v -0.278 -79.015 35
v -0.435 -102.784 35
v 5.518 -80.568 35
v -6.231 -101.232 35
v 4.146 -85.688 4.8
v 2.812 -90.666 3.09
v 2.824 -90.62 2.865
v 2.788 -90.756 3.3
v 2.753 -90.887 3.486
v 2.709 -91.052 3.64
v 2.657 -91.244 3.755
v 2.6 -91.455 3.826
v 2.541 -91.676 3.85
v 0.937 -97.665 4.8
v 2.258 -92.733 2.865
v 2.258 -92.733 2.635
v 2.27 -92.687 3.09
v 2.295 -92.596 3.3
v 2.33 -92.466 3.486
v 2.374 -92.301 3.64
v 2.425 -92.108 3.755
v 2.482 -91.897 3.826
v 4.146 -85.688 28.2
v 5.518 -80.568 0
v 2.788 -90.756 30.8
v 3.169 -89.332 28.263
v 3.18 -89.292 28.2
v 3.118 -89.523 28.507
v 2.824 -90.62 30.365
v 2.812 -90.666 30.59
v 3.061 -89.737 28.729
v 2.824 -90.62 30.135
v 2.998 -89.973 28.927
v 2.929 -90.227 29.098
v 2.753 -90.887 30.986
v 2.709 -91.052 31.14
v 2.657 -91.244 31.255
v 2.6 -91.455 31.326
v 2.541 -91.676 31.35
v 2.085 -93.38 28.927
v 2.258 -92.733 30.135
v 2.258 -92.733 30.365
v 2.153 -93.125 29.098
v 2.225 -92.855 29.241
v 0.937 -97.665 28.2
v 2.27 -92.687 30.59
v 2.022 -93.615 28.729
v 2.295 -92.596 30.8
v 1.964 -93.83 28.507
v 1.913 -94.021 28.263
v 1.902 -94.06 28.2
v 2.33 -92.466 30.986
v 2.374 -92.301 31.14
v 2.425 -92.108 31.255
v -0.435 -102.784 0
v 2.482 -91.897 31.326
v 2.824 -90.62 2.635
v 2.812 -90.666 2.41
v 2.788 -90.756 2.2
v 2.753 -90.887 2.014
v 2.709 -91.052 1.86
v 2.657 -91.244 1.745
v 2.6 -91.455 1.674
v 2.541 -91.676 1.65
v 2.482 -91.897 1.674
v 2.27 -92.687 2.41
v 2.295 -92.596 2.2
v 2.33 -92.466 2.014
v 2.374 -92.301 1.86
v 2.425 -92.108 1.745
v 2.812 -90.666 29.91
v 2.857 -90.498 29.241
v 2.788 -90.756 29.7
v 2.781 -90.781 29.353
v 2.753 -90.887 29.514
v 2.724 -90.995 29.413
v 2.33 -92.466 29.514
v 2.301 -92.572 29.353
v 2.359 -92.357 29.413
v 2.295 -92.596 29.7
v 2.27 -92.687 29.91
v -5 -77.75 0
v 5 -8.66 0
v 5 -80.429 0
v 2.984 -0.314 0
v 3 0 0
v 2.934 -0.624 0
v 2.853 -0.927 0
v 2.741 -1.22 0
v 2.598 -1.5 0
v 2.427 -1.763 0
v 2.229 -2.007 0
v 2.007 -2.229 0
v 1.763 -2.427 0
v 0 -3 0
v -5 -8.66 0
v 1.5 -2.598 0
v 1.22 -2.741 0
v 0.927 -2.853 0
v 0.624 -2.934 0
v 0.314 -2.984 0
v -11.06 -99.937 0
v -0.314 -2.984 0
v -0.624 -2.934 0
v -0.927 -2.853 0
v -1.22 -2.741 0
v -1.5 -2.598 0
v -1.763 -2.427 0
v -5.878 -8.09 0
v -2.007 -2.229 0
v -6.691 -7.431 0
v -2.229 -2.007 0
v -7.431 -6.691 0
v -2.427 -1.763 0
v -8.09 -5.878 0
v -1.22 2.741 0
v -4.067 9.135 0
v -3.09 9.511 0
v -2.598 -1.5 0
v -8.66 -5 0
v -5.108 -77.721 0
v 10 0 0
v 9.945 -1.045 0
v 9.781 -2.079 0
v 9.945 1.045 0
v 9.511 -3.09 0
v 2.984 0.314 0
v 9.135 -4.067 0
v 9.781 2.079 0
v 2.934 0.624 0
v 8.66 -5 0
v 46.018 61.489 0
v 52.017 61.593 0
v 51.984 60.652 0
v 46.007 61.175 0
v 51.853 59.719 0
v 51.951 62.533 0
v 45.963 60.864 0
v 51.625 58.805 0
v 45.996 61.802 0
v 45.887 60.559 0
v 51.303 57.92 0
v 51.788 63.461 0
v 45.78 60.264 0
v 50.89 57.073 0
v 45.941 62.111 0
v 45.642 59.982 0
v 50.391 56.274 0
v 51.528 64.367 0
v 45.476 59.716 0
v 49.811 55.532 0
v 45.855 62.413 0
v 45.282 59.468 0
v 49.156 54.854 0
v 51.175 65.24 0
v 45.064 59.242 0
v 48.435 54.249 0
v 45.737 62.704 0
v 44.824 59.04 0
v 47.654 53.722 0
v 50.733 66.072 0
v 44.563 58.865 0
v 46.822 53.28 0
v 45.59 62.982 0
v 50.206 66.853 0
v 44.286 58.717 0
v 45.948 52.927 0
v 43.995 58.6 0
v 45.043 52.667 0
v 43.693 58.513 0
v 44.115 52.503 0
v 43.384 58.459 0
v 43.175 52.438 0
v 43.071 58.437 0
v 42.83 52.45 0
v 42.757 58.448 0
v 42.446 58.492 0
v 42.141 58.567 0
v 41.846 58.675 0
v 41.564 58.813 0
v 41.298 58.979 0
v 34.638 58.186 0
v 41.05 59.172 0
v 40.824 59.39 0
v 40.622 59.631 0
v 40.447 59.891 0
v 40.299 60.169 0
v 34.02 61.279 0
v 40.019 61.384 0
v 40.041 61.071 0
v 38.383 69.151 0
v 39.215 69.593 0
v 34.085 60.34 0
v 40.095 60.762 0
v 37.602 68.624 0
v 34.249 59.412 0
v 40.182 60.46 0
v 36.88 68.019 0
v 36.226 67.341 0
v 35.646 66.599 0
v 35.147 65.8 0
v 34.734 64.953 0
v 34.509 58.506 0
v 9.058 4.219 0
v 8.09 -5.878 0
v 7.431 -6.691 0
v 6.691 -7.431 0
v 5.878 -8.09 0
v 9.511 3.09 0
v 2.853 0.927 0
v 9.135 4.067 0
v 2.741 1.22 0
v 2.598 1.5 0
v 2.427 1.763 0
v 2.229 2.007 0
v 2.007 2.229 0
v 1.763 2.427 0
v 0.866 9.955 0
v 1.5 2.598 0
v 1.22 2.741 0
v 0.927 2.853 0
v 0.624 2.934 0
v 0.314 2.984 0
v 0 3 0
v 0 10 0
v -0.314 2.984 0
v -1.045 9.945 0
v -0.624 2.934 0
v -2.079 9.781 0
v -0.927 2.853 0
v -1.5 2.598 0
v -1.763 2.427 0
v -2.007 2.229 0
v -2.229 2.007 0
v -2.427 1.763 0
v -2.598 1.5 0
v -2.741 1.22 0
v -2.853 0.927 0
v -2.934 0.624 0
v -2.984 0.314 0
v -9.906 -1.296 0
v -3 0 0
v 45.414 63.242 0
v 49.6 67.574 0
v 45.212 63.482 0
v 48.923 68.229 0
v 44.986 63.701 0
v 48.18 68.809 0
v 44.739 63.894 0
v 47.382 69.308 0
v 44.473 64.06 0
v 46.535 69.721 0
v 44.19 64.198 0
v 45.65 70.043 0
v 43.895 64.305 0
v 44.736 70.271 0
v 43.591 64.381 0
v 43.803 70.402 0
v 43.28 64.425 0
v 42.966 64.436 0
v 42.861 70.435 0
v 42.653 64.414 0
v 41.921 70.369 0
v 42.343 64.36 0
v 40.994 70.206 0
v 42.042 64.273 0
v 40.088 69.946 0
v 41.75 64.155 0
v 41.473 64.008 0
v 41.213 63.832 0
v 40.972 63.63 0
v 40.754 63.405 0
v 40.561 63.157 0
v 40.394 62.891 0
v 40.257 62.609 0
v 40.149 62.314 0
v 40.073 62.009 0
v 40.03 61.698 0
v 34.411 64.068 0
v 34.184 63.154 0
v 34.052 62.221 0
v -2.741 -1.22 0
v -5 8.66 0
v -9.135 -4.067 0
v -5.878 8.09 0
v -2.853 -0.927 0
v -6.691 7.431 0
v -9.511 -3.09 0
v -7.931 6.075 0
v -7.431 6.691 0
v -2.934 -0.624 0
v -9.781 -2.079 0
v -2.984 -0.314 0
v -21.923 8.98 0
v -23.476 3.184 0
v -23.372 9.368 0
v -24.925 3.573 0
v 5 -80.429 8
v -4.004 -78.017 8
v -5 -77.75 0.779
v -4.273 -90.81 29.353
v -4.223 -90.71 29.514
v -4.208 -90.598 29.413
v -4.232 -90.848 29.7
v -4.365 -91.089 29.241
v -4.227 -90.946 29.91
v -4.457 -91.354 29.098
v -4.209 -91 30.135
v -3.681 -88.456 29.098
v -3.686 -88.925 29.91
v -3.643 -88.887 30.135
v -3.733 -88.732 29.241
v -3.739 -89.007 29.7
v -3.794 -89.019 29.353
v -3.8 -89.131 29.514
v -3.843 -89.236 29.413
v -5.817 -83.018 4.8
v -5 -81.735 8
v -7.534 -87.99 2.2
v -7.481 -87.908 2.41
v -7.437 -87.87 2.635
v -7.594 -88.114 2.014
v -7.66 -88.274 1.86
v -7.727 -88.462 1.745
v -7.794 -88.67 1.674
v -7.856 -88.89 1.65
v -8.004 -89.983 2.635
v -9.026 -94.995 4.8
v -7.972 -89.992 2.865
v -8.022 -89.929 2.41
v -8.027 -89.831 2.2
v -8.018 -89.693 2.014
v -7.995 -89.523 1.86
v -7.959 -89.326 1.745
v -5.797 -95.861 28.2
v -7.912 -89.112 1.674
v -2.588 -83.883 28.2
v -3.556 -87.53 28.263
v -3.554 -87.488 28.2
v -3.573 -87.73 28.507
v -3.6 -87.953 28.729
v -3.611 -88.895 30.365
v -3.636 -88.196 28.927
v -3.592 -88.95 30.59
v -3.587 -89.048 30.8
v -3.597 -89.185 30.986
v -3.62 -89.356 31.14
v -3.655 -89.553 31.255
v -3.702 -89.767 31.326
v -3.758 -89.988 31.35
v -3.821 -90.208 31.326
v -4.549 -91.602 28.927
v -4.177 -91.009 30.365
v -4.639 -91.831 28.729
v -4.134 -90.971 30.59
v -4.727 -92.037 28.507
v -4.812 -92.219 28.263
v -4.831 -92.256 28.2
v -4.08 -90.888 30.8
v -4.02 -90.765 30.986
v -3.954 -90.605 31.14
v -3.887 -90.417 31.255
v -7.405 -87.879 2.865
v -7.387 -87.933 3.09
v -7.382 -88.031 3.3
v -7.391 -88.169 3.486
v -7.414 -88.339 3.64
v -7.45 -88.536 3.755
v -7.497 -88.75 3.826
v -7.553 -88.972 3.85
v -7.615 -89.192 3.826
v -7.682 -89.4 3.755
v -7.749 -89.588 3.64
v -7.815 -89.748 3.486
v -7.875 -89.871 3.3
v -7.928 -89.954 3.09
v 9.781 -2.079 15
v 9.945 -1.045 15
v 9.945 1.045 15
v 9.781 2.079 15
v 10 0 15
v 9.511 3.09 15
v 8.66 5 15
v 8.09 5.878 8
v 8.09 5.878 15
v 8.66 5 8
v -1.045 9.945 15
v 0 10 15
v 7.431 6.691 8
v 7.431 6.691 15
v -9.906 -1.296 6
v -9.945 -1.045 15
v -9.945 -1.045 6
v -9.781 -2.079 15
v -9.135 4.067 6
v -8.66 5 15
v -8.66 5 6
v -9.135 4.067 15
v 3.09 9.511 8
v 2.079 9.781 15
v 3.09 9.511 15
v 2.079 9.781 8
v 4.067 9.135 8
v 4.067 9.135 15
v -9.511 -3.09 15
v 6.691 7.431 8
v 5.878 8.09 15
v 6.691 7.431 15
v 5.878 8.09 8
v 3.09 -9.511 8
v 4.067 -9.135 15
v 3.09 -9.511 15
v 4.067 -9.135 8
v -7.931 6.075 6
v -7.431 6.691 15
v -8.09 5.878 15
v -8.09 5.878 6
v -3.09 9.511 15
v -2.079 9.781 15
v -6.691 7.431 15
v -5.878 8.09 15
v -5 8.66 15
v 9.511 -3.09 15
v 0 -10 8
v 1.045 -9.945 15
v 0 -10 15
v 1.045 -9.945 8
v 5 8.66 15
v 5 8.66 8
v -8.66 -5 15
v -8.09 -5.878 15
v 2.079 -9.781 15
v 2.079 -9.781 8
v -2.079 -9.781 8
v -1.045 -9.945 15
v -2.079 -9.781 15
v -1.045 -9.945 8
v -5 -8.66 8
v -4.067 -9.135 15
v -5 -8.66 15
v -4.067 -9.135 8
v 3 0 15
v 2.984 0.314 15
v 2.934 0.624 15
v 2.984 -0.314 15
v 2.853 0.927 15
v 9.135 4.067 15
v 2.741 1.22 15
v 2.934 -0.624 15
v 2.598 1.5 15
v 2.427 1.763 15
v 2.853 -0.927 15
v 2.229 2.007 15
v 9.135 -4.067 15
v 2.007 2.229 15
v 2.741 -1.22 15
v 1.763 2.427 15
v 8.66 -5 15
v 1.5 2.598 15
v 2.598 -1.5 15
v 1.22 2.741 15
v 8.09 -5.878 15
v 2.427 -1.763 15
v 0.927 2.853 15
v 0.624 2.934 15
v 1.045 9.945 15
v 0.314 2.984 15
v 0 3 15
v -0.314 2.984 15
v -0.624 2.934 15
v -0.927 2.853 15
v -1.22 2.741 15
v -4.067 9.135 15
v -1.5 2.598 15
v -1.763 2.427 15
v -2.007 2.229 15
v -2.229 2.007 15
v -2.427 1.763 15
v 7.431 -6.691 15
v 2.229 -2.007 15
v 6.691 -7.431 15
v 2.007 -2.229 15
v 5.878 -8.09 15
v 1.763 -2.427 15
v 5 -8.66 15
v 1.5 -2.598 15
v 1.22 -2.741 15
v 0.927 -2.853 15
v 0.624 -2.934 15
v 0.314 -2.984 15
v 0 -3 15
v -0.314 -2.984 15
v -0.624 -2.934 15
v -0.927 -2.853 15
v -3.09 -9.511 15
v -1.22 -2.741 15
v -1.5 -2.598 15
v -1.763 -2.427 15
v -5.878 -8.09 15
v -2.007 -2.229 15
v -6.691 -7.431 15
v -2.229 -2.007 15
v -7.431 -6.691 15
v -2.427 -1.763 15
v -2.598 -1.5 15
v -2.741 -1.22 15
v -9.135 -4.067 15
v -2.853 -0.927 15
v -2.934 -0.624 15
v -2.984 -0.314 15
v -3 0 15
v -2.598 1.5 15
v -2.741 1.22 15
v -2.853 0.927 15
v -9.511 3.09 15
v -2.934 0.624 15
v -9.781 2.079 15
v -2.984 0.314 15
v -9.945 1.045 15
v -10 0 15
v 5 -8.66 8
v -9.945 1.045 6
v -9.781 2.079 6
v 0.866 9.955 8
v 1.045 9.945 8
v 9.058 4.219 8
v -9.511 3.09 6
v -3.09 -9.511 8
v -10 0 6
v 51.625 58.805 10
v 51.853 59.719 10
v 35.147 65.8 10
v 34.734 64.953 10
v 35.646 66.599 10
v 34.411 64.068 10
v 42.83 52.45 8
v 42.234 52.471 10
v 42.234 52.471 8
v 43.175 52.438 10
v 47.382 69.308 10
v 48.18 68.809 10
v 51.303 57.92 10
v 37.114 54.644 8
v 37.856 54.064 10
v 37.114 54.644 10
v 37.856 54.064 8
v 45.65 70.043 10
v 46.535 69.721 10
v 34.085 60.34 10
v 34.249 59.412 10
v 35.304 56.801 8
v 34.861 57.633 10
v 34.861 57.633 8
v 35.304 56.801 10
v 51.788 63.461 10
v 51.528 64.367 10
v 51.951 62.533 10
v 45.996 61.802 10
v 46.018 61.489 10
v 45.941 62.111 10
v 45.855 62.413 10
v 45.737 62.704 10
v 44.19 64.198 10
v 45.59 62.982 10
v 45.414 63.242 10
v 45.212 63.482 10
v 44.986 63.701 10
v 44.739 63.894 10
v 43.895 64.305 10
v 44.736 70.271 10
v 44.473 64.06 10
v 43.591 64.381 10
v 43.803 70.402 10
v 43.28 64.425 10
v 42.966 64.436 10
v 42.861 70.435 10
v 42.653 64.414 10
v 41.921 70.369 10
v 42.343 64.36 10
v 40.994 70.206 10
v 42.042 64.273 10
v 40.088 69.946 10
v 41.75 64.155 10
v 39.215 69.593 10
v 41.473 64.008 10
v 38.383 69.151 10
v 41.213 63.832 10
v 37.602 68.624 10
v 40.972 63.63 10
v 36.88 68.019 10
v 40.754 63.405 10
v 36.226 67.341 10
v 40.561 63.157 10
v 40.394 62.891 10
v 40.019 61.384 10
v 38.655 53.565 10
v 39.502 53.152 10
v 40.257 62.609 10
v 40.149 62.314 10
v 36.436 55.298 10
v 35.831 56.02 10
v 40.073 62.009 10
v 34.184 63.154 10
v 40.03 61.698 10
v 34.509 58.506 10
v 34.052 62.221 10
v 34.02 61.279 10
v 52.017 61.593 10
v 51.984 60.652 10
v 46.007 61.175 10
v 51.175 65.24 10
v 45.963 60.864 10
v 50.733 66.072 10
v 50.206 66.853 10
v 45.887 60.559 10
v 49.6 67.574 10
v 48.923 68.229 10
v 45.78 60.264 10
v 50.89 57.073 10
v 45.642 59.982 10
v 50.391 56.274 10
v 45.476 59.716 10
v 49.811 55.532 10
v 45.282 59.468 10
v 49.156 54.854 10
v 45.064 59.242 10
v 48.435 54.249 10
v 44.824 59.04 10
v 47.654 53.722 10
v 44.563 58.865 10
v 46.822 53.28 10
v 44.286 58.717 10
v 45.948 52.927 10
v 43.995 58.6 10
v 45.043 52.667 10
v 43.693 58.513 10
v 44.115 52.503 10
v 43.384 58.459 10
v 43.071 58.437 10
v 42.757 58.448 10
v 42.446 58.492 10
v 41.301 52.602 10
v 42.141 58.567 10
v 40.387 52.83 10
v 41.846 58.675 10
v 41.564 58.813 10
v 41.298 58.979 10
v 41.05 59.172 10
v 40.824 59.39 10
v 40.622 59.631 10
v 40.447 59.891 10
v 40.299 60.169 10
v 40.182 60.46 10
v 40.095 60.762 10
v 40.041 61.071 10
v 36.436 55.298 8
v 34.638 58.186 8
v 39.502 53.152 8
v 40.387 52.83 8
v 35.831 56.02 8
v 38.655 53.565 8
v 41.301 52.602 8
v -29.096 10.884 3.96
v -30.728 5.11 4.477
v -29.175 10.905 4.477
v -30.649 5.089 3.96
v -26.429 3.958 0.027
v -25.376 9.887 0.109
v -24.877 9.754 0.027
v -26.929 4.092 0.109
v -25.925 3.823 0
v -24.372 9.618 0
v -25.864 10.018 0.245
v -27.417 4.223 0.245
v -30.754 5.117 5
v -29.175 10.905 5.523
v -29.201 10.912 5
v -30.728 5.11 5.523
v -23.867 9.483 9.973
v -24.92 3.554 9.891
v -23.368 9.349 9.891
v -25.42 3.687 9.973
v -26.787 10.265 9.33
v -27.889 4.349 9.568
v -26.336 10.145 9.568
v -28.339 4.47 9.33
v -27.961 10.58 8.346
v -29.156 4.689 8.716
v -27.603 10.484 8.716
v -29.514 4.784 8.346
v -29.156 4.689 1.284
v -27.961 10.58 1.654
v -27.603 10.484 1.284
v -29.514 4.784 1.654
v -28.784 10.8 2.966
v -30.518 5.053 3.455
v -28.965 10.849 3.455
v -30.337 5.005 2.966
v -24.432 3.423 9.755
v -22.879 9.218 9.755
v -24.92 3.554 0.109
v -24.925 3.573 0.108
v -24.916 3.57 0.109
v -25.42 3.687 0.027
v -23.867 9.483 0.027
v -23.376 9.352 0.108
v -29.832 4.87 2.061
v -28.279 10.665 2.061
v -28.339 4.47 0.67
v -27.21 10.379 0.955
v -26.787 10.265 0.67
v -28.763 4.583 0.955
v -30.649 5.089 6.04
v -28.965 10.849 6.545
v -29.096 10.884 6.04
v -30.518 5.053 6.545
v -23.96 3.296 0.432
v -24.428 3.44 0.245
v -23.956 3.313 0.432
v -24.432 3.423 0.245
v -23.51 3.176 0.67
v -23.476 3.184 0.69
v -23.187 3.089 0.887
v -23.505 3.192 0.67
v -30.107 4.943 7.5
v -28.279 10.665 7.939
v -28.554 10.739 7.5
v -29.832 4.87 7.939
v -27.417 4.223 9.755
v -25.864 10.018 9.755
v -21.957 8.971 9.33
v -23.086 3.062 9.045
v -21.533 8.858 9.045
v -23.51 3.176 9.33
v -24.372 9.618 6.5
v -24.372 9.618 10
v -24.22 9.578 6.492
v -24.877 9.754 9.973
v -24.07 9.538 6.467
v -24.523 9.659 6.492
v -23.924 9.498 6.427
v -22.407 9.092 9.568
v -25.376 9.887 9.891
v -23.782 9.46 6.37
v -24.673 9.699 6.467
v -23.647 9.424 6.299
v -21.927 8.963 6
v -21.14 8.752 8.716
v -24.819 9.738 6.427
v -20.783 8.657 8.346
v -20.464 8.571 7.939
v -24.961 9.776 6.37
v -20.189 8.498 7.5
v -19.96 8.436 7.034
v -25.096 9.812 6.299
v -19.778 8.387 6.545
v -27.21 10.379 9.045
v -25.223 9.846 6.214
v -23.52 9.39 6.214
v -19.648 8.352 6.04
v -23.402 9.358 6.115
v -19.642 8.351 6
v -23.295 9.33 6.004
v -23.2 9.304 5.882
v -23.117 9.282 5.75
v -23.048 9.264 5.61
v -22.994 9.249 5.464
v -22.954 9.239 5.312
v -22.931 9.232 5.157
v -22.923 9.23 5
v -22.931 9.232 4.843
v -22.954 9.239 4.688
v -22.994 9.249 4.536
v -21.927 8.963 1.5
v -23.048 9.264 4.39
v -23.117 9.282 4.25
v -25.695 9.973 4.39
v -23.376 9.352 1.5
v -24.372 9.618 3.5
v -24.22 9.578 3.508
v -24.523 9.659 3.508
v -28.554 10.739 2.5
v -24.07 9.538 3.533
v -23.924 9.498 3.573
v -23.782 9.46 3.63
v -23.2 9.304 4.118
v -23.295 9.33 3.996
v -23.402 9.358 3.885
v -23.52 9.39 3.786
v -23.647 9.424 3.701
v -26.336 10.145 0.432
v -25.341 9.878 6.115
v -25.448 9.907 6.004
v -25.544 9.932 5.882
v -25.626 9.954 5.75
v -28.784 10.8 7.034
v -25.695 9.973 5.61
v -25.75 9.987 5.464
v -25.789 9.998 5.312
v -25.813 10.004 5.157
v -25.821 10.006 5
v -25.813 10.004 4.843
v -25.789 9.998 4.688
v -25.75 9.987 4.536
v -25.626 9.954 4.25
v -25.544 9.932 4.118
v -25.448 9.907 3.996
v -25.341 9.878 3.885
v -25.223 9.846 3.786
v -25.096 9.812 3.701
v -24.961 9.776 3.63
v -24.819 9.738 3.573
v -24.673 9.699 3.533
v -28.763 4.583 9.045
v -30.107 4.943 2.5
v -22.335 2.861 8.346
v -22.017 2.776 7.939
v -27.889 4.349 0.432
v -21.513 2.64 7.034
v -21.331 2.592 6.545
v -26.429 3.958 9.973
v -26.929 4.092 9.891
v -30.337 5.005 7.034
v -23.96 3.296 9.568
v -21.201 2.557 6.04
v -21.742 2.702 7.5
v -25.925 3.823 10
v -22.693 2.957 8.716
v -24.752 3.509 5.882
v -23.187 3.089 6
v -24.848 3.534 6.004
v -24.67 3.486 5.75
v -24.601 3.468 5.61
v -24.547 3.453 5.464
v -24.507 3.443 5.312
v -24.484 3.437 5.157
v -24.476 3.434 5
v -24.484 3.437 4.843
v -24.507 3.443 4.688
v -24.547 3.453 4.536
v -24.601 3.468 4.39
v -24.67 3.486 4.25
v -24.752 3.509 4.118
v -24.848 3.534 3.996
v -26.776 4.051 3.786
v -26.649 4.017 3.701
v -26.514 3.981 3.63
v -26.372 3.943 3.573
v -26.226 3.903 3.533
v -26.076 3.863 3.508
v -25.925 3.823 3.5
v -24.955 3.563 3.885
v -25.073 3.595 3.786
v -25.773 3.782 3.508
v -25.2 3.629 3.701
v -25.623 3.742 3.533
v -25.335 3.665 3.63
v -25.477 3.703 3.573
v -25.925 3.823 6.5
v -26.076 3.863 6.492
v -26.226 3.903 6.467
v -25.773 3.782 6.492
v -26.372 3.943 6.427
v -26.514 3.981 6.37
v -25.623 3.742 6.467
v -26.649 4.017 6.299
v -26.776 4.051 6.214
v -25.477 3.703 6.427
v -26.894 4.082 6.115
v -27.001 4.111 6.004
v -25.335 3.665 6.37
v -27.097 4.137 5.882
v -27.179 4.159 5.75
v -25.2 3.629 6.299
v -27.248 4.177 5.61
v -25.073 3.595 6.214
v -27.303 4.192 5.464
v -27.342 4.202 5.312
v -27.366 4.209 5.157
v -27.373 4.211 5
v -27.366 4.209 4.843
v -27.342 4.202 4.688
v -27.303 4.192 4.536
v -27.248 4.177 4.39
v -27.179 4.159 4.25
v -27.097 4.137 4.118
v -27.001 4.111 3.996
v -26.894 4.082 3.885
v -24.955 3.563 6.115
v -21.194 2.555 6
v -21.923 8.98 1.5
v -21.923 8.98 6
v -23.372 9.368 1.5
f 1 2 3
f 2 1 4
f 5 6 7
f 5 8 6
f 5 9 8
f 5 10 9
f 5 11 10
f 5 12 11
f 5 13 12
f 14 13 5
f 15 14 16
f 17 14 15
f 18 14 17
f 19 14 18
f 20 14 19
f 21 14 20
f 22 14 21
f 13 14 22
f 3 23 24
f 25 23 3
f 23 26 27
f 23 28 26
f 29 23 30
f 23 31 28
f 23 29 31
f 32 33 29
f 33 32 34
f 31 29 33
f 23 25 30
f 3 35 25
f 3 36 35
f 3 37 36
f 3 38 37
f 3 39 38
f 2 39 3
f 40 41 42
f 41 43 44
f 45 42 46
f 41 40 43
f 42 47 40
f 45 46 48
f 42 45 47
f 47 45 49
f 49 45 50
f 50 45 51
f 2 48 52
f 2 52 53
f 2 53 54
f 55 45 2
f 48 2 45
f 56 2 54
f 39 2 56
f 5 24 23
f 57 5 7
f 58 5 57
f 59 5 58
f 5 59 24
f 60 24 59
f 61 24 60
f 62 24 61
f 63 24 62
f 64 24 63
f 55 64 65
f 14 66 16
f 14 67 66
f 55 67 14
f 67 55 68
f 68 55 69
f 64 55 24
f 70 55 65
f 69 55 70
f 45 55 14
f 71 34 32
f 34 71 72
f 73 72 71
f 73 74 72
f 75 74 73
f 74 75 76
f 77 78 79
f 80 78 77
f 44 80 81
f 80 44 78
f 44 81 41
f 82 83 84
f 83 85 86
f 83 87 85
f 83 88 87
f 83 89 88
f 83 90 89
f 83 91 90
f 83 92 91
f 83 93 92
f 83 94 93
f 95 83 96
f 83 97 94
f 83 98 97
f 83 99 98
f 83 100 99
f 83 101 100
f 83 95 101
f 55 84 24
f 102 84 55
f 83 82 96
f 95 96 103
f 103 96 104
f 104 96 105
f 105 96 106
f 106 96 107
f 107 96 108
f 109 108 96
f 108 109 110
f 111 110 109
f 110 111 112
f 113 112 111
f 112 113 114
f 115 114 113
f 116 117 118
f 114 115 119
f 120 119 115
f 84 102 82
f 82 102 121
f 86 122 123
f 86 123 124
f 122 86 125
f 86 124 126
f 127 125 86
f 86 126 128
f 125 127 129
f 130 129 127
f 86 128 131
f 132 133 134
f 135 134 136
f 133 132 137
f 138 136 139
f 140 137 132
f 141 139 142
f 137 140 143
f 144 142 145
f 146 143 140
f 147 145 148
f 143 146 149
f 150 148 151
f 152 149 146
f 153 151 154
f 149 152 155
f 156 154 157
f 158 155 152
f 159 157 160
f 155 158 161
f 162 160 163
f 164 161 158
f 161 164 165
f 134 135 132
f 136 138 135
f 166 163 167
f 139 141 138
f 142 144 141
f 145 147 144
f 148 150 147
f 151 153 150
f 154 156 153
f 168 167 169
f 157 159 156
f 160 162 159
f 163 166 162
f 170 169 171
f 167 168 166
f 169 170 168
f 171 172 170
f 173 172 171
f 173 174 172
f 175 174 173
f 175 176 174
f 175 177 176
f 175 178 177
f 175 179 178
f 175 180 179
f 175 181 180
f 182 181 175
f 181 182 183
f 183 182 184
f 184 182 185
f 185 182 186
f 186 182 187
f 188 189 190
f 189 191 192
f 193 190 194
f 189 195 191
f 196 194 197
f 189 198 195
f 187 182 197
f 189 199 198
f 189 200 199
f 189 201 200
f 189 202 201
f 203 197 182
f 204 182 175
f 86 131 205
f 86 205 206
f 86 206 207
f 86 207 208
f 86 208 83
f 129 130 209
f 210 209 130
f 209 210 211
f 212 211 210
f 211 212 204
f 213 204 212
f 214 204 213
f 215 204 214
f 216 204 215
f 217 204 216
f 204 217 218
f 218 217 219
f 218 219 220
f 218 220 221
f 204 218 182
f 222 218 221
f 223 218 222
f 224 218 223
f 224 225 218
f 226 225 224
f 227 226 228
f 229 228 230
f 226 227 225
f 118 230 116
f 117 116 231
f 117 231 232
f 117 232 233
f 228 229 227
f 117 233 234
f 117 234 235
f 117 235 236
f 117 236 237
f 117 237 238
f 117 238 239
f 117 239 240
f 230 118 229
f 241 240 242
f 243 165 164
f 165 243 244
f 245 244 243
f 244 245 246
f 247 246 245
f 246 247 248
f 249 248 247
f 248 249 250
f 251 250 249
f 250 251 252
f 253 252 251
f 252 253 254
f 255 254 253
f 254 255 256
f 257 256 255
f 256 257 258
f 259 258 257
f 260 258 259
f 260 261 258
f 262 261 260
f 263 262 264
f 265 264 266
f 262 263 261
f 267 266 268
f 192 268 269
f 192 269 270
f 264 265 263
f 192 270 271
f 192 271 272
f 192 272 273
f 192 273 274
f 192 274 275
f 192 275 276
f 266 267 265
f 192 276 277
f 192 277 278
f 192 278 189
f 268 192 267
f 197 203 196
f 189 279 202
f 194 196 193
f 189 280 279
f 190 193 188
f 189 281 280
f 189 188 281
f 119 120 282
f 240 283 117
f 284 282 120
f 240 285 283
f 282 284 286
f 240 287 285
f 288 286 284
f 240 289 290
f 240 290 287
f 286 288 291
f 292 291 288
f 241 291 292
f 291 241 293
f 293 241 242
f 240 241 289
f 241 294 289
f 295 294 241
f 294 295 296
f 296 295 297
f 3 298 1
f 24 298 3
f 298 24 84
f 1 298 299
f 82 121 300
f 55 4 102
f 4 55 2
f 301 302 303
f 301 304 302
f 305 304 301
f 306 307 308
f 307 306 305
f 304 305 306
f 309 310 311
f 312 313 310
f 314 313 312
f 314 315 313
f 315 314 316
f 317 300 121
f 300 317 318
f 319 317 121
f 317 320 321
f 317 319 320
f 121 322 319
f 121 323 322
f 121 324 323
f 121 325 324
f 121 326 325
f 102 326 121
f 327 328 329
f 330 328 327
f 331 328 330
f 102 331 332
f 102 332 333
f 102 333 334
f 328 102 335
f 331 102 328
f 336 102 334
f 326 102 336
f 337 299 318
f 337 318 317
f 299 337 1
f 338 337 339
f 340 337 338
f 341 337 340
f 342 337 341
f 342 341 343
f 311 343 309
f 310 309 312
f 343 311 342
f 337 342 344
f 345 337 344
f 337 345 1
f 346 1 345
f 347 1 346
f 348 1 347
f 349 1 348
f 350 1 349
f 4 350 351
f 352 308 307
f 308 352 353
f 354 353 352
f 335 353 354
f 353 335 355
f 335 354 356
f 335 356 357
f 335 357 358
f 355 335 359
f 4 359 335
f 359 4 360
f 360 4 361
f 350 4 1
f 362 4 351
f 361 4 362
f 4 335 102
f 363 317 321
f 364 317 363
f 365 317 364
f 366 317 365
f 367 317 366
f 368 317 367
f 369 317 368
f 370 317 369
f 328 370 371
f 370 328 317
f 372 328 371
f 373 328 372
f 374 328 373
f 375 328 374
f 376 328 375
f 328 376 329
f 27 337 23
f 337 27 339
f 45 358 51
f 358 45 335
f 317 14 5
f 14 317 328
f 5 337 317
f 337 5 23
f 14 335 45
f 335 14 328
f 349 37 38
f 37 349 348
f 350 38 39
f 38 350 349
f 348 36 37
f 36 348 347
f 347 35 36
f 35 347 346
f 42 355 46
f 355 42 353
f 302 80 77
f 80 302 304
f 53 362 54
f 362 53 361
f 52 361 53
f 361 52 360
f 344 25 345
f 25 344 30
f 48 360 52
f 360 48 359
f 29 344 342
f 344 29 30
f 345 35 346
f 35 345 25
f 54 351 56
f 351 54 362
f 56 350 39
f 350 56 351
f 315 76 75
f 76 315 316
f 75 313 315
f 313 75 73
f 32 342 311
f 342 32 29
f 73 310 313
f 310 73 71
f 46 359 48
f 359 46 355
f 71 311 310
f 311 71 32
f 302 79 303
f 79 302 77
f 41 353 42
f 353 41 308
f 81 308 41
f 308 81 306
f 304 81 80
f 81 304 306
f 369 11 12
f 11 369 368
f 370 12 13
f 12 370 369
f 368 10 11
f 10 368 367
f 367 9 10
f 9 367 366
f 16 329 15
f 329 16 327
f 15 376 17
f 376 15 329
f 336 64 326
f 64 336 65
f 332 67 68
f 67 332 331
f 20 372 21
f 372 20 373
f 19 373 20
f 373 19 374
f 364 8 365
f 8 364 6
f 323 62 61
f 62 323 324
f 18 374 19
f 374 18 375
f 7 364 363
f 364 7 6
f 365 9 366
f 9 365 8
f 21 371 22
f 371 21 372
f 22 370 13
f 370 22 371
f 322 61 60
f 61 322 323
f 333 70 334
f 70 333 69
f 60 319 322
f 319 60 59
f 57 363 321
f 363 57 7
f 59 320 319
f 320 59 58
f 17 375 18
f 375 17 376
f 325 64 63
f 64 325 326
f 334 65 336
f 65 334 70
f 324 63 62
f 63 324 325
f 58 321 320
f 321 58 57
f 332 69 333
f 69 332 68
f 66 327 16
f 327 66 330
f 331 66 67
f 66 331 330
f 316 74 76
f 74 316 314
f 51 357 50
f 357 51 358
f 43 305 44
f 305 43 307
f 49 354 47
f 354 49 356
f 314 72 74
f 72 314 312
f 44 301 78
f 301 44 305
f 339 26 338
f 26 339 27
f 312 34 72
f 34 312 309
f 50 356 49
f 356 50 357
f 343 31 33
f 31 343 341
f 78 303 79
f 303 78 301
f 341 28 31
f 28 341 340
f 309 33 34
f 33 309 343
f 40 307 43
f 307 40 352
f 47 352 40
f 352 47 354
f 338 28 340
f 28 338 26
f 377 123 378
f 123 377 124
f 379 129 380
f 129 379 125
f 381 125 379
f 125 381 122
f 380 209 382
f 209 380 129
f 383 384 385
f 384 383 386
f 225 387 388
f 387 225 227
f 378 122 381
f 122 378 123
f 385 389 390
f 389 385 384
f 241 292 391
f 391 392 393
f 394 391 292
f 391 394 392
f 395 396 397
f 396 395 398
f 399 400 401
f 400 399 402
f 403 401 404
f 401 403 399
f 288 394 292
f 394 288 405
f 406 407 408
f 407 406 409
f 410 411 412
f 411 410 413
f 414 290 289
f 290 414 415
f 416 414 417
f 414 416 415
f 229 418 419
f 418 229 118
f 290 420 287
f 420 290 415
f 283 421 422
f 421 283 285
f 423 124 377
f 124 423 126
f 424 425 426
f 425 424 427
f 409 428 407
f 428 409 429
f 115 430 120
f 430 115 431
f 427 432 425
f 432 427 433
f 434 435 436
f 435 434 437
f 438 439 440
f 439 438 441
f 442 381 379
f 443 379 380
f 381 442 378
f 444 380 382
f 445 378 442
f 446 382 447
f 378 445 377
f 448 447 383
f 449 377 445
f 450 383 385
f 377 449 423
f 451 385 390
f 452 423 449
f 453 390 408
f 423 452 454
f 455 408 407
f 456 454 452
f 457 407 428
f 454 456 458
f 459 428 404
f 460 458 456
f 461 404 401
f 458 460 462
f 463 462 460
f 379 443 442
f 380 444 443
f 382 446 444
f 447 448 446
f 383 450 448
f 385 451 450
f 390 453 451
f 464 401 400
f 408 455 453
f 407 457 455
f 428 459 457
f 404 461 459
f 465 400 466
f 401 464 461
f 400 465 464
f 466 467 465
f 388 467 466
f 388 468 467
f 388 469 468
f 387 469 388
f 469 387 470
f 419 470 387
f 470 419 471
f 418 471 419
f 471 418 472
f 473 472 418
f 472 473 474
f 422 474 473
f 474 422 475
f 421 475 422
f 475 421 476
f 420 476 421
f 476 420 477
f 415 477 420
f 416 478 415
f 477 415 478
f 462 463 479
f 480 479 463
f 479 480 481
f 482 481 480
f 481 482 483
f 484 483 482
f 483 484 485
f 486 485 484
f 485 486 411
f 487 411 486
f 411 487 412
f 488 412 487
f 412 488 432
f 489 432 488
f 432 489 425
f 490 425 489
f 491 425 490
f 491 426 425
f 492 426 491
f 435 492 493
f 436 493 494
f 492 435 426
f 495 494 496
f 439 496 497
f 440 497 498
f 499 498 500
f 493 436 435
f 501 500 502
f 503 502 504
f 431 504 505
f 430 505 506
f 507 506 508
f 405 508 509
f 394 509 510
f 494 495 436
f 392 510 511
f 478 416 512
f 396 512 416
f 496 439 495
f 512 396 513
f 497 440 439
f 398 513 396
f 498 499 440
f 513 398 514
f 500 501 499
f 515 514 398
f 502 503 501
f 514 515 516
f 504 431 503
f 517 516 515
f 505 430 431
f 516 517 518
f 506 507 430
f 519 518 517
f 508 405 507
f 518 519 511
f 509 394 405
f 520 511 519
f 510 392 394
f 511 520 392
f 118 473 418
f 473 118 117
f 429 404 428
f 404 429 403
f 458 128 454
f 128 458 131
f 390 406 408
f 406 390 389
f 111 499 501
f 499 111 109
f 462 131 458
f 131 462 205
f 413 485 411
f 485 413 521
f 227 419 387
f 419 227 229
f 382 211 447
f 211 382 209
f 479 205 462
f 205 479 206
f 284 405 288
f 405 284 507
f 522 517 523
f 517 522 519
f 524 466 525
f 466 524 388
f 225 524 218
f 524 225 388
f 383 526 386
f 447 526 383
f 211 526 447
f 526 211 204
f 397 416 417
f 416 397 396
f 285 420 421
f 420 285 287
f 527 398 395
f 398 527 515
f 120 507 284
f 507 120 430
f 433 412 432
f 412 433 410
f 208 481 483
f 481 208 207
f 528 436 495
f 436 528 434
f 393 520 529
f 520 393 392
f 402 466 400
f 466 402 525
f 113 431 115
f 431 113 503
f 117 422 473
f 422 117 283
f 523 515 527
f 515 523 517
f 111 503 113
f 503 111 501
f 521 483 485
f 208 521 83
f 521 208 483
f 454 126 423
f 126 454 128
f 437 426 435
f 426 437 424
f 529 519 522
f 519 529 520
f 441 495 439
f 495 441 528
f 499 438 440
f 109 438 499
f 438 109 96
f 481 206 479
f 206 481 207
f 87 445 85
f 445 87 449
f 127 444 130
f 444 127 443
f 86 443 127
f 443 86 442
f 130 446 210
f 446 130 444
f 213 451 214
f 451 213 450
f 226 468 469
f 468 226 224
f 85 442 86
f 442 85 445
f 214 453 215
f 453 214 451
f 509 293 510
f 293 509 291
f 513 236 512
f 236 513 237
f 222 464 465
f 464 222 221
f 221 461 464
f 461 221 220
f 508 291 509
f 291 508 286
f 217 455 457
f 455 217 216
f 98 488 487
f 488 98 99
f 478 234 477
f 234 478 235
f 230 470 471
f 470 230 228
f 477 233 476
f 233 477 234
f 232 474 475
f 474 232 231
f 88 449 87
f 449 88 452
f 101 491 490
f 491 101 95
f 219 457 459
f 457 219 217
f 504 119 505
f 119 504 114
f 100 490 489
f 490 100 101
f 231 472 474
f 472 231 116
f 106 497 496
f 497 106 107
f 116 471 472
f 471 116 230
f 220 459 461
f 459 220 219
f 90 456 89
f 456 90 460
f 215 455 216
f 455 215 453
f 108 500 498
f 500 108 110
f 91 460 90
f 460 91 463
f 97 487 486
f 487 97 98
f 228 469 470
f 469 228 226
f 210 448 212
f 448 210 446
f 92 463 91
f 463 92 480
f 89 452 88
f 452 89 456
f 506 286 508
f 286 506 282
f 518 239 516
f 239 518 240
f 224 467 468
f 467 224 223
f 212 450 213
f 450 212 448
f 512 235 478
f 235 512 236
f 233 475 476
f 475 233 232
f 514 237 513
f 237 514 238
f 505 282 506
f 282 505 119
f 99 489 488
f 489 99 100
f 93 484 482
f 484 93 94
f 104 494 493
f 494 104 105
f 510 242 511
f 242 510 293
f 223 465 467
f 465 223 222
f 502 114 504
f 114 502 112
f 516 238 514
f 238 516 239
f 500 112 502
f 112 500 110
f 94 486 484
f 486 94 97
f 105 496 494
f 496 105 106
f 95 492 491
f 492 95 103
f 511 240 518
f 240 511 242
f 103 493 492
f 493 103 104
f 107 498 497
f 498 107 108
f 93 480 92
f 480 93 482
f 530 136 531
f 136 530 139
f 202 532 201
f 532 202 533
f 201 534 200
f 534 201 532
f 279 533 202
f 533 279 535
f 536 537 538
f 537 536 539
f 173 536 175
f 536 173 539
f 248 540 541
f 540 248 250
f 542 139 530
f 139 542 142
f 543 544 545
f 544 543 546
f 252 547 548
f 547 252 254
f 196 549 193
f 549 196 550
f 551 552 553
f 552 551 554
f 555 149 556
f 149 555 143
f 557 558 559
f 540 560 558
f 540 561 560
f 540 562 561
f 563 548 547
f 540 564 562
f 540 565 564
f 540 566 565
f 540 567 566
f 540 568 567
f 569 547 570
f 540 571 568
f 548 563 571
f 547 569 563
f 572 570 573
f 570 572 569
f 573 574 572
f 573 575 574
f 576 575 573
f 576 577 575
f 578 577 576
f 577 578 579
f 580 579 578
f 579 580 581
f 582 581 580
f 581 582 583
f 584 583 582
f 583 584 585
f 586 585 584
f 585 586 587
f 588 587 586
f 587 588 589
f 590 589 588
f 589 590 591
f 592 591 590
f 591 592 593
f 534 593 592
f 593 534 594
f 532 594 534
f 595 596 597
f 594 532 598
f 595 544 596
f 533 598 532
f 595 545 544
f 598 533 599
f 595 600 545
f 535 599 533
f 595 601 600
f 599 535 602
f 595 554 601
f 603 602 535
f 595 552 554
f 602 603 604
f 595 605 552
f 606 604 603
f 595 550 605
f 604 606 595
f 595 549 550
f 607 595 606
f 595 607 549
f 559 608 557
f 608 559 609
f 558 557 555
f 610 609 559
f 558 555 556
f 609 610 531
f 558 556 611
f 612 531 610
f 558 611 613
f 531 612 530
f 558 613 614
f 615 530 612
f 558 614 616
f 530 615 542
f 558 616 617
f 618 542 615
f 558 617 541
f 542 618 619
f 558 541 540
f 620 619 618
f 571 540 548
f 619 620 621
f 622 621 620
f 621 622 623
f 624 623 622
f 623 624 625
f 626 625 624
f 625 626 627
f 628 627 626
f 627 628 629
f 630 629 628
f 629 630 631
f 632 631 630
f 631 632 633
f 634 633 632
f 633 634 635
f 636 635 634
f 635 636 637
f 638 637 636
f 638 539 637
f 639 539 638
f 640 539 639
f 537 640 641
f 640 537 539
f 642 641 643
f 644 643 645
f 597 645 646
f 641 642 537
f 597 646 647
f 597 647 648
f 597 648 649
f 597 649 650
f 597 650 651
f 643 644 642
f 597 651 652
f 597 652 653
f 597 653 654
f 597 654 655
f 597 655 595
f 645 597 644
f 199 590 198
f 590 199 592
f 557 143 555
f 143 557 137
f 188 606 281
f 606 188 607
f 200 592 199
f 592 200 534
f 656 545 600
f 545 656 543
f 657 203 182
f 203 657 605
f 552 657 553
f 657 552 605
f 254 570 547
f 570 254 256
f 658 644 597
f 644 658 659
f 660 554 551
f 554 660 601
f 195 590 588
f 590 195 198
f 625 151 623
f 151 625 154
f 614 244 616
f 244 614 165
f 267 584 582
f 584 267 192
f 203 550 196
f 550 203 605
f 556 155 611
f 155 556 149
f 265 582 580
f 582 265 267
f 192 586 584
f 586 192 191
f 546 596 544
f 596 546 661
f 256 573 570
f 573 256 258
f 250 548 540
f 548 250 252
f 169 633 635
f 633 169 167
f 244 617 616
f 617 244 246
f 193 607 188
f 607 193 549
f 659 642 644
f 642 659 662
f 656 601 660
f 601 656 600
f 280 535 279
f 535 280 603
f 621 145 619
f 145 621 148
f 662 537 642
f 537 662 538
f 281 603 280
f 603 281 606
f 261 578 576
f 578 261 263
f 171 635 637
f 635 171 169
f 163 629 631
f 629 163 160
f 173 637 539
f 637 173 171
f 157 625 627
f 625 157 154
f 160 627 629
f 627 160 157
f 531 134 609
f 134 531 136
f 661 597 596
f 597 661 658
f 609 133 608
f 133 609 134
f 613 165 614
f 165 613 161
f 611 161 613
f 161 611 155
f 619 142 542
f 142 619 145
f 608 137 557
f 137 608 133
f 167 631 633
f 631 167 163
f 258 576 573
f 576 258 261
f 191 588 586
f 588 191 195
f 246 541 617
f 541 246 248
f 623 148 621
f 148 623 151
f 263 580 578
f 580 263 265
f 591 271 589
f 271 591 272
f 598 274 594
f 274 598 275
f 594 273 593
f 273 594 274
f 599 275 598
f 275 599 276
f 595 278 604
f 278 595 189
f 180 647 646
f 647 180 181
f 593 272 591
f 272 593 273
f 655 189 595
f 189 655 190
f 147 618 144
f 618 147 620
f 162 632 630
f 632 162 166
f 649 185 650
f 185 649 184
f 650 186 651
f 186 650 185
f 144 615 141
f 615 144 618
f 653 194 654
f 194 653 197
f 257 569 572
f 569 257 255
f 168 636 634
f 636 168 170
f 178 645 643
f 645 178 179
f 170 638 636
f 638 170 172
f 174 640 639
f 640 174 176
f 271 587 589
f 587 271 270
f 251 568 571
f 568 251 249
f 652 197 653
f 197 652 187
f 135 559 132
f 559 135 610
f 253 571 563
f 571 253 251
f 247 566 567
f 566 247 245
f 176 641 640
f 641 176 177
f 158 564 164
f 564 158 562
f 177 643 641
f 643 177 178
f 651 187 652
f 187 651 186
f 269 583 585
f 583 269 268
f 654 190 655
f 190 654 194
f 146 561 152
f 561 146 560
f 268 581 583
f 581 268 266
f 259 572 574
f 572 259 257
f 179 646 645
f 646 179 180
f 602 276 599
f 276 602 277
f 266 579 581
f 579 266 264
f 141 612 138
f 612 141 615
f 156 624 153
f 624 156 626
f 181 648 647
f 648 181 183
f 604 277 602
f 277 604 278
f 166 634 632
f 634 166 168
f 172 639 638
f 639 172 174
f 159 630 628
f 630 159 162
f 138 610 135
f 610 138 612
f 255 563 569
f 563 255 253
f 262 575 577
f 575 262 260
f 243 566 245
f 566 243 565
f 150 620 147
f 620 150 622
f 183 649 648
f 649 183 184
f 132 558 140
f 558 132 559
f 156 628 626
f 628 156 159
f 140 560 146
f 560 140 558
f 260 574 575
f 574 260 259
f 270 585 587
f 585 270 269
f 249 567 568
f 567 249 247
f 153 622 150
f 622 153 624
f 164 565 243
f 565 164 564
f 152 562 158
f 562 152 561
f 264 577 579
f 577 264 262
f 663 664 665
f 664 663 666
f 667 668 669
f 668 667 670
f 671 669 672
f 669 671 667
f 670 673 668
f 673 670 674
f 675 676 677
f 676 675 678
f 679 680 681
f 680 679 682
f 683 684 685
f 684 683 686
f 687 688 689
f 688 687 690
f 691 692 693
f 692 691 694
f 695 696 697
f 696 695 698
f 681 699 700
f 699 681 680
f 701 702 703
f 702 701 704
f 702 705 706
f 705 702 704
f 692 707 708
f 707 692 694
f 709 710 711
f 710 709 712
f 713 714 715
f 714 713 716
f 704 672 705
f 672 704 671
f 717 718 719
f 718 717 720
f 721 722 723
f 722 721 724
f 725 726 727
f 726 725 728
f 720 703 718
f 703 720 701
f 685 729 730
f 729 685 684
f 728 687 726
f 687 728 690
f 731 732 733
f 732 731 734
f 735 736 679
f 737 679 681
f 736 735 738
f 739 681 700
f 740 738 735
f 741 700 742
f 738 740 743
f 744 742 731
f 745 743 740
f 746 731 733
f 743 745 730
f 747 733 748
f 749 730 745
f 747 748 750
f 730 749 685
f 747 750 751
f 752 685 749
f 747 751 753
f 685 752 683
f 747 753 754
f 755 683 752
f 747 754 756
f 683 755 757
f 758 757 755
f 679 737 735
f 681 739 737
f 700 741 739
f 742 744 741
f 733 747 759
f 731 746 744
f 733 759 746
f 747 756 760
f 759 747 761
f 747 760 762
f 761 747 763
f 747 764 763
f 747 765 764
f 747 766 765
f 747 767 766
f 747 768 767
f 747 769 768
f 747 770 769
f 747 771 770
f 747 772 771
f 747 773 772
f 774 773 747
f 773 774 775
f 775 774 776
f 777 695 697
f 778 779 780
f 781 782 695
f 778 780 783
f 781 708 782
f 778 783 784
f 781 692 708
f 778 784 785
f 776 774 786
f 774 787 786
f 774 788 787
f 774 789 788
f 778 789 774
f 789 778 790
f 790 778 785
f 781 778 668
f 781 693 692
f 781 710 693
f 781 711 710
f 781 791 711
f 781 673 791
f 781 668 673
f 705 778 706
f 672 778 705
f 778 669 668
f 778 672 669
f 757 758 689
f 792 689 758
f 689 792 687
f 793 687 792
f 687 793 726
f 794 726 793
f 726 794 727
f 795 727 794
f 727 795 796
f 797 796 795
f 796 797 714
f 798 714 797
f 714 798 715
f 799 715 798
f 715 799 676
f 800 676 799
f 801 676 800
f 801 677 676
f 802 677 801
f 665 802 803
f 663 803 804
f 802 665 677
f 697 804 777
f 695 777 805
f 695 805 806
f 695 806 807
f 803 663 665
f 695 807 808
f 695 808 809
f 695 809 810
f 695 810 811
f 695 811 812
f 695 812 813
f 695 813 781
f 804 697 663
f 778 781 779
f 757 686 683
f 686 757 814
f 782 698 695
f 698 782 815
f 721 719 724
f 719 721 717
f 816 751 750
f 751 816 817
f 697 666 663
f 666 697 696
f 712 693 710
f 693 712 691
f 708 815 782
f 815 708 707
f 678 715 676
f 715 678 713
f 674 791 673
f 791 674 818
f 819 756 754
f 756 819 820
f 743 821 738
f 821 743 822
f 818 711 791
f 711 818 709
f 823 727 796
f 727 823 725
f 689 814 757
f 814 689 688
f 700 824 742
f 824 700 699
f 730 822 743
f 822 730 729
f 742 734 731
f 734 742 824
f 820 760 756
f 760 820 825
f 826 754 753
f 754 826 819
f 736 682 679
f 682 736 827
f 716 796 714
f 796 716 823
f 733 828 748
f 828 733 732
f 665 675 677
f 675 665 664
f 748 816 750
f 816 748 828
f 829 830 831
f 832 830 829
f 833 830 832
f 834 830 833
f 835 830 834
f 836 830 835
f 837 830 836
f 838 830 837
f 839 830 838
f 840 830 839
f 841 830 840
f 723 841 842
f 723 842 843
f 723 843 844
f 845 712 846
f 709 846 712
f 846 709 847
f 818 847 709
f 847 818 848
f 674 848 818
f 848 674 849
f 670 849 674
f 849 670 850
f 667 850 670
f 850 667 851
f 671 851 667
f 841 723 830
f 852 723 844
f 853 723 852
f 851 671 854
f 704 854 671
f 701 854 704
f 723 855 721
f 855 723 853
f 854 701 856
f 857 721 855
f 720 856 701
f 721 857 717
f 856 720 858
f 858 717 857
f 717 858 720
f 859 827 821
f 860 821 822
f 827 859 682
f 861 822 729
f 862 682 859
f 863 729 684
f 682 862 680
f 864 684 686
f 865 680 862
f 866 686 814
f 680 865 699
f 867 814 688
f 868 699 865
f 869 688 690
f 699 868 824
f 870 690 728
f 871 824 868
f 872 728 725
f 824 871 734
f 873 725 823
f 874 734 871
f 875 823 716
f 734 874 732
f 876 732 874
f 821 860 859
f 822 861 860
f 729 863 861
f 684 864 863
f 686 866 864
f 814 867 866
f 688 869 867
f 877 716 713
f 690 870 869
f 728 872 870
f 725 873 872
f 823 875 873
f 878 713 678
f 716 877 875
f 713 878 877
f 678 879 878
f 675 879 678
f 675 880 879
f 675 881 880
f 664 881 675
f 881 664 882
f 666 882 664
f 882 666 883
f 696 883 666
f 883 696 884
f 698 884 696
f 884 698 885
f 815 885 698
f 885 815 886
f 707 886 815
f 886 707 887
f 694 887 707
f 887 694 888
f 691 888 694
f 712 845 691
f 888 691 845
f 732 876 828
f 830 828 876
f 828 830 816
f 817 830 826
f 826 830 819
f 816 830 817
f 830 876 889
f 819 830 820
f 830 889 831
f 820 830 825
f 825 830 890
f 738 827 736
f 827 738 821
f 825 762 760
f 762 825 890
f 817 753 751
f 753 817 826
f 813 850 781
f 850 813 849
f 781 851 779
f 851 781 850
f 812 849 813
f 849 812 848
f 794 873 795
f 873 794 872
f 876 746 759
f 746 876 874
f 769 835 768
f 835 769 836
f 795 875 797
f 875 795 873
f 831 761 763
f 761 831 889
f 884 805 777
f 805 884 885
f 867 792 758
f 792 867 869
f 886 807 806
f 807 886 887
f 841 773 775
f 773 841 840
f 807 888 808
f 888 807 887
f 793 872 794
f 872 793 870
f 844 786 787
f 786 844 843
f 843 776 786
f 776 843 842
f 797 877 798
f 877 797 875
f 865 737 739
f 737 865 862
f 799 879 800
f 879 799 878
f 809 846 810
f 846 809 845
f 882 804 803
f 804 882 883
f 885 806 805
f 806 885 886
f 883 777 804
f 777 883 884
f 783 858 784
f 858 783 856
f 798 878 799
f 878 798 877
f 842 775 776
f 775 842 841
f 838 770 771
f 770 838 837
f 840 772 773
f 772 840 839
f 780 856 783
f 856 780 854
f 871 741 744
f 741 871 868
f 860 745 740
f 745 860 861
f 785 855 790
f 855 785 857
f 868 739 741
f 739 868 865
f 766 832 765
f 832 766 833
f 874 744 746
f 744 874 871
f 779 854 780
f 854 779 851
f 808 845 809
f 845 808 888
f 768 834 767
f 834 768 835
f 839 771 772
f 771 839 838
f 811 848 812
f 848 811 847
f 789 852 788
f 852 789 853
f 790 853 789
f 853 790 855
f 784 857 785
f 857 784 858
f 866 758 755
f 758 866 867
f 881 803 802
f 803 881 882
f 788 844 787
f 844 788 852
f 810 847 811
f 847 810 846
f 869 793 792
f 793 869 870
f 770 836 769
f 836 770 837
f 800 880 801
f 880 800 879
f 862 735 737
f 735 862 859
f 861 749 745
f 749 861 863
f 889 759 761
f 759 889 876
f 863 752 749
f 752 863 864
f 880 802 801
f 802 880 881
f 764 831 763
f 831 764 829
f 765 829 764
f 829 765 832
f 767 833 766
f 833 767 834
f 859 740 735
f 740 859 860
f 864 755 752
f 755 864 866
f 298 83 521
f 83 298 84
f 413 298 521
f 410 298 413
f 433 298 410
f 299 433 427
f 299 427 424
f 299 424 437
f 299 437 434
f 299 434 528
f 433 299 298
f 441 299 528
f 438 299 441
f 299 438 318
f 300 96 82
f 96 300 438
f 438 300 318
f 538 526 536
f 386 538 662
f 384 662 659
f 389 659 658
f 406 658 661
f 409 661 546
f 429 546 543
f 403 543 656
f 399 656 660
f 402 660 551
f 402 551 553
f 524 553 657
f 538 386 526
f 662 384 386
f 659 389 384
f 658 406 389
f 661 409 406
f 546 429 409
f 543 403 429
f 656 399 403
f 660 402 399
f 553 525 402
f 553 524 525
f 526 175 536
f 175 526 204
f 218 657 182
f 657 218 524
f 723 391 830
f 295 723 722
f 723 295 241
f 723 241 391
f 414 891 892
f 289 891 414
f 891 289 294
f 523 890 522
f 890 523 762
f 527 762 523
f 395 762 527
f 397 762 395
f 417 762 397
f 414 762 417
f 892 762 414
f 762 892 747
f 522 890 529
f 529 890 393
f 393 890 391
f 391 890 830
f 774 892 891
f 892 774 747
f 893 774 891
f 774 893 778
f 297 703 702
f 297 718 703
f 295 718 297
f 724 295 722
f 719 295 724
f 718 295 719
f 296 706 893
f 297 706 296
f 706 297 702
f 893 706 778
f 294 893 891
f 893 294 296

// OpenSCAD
$fn=60;

translate([5,-82.5,0])rotate([0,-90,-15])
translate([16.5,-9.5,0])
servo_bracket();

translate([-5,-82.5,0])cube([10,78.5,8]);

difference(){
cylinder(d=20,h=15);
translate([0,0,-1])cylinder(d=6,h=17);
}

rotate([0,0,145])
translate([-5,-70,0])cube([10,64.5,8]);

rotate([0,0,145])translate([0,-75,0])
difference(){
cylinder(d=18,h=10);
translate([0,0,-1])cylinder(d=6,h=12);
}

rotate([0,0,75]) translate([0,6,0])
linear_extrude(height=6)
polygon([[-4,0],[4,0],[3,17.5],[-3,17.5]]);

rotate([0,0,75]) translate([-3,19,0])
cube([6,6,1.5]);

translate([-1,0.25,5])rotate([0,0,75]) 
translate([0,25,0])rotate([0,90,0])
difference(){
cylinder(d=10,h=6,center=true);
cylinder(d=3,h=7,center=true);
}

module servo_bracket(){
difference(){
union(){
translate([1,0,2.5])cube([35,23,5],center=true);
translate([0,11.5,3])
rotate([90,0,0])linear_extrude(height=23)
polygon([[-16.5,0],[18.5,2],[18.5,3],[-16.5,8]]);
translate([13.75,0,0])cylinder(d=8,h=2,$fn=60);
}
cube([23.4,12.4,50],center=true);
translate([13.75,0,-1])cylinder(d=2.2,h=50,$fn=30);
translate([-13.75,0,-1])cylinder(d=2.2,h=50,$fn=30);
translate([10,0,0])cylinder(d=6,h=12,$fn=60);
}
}
